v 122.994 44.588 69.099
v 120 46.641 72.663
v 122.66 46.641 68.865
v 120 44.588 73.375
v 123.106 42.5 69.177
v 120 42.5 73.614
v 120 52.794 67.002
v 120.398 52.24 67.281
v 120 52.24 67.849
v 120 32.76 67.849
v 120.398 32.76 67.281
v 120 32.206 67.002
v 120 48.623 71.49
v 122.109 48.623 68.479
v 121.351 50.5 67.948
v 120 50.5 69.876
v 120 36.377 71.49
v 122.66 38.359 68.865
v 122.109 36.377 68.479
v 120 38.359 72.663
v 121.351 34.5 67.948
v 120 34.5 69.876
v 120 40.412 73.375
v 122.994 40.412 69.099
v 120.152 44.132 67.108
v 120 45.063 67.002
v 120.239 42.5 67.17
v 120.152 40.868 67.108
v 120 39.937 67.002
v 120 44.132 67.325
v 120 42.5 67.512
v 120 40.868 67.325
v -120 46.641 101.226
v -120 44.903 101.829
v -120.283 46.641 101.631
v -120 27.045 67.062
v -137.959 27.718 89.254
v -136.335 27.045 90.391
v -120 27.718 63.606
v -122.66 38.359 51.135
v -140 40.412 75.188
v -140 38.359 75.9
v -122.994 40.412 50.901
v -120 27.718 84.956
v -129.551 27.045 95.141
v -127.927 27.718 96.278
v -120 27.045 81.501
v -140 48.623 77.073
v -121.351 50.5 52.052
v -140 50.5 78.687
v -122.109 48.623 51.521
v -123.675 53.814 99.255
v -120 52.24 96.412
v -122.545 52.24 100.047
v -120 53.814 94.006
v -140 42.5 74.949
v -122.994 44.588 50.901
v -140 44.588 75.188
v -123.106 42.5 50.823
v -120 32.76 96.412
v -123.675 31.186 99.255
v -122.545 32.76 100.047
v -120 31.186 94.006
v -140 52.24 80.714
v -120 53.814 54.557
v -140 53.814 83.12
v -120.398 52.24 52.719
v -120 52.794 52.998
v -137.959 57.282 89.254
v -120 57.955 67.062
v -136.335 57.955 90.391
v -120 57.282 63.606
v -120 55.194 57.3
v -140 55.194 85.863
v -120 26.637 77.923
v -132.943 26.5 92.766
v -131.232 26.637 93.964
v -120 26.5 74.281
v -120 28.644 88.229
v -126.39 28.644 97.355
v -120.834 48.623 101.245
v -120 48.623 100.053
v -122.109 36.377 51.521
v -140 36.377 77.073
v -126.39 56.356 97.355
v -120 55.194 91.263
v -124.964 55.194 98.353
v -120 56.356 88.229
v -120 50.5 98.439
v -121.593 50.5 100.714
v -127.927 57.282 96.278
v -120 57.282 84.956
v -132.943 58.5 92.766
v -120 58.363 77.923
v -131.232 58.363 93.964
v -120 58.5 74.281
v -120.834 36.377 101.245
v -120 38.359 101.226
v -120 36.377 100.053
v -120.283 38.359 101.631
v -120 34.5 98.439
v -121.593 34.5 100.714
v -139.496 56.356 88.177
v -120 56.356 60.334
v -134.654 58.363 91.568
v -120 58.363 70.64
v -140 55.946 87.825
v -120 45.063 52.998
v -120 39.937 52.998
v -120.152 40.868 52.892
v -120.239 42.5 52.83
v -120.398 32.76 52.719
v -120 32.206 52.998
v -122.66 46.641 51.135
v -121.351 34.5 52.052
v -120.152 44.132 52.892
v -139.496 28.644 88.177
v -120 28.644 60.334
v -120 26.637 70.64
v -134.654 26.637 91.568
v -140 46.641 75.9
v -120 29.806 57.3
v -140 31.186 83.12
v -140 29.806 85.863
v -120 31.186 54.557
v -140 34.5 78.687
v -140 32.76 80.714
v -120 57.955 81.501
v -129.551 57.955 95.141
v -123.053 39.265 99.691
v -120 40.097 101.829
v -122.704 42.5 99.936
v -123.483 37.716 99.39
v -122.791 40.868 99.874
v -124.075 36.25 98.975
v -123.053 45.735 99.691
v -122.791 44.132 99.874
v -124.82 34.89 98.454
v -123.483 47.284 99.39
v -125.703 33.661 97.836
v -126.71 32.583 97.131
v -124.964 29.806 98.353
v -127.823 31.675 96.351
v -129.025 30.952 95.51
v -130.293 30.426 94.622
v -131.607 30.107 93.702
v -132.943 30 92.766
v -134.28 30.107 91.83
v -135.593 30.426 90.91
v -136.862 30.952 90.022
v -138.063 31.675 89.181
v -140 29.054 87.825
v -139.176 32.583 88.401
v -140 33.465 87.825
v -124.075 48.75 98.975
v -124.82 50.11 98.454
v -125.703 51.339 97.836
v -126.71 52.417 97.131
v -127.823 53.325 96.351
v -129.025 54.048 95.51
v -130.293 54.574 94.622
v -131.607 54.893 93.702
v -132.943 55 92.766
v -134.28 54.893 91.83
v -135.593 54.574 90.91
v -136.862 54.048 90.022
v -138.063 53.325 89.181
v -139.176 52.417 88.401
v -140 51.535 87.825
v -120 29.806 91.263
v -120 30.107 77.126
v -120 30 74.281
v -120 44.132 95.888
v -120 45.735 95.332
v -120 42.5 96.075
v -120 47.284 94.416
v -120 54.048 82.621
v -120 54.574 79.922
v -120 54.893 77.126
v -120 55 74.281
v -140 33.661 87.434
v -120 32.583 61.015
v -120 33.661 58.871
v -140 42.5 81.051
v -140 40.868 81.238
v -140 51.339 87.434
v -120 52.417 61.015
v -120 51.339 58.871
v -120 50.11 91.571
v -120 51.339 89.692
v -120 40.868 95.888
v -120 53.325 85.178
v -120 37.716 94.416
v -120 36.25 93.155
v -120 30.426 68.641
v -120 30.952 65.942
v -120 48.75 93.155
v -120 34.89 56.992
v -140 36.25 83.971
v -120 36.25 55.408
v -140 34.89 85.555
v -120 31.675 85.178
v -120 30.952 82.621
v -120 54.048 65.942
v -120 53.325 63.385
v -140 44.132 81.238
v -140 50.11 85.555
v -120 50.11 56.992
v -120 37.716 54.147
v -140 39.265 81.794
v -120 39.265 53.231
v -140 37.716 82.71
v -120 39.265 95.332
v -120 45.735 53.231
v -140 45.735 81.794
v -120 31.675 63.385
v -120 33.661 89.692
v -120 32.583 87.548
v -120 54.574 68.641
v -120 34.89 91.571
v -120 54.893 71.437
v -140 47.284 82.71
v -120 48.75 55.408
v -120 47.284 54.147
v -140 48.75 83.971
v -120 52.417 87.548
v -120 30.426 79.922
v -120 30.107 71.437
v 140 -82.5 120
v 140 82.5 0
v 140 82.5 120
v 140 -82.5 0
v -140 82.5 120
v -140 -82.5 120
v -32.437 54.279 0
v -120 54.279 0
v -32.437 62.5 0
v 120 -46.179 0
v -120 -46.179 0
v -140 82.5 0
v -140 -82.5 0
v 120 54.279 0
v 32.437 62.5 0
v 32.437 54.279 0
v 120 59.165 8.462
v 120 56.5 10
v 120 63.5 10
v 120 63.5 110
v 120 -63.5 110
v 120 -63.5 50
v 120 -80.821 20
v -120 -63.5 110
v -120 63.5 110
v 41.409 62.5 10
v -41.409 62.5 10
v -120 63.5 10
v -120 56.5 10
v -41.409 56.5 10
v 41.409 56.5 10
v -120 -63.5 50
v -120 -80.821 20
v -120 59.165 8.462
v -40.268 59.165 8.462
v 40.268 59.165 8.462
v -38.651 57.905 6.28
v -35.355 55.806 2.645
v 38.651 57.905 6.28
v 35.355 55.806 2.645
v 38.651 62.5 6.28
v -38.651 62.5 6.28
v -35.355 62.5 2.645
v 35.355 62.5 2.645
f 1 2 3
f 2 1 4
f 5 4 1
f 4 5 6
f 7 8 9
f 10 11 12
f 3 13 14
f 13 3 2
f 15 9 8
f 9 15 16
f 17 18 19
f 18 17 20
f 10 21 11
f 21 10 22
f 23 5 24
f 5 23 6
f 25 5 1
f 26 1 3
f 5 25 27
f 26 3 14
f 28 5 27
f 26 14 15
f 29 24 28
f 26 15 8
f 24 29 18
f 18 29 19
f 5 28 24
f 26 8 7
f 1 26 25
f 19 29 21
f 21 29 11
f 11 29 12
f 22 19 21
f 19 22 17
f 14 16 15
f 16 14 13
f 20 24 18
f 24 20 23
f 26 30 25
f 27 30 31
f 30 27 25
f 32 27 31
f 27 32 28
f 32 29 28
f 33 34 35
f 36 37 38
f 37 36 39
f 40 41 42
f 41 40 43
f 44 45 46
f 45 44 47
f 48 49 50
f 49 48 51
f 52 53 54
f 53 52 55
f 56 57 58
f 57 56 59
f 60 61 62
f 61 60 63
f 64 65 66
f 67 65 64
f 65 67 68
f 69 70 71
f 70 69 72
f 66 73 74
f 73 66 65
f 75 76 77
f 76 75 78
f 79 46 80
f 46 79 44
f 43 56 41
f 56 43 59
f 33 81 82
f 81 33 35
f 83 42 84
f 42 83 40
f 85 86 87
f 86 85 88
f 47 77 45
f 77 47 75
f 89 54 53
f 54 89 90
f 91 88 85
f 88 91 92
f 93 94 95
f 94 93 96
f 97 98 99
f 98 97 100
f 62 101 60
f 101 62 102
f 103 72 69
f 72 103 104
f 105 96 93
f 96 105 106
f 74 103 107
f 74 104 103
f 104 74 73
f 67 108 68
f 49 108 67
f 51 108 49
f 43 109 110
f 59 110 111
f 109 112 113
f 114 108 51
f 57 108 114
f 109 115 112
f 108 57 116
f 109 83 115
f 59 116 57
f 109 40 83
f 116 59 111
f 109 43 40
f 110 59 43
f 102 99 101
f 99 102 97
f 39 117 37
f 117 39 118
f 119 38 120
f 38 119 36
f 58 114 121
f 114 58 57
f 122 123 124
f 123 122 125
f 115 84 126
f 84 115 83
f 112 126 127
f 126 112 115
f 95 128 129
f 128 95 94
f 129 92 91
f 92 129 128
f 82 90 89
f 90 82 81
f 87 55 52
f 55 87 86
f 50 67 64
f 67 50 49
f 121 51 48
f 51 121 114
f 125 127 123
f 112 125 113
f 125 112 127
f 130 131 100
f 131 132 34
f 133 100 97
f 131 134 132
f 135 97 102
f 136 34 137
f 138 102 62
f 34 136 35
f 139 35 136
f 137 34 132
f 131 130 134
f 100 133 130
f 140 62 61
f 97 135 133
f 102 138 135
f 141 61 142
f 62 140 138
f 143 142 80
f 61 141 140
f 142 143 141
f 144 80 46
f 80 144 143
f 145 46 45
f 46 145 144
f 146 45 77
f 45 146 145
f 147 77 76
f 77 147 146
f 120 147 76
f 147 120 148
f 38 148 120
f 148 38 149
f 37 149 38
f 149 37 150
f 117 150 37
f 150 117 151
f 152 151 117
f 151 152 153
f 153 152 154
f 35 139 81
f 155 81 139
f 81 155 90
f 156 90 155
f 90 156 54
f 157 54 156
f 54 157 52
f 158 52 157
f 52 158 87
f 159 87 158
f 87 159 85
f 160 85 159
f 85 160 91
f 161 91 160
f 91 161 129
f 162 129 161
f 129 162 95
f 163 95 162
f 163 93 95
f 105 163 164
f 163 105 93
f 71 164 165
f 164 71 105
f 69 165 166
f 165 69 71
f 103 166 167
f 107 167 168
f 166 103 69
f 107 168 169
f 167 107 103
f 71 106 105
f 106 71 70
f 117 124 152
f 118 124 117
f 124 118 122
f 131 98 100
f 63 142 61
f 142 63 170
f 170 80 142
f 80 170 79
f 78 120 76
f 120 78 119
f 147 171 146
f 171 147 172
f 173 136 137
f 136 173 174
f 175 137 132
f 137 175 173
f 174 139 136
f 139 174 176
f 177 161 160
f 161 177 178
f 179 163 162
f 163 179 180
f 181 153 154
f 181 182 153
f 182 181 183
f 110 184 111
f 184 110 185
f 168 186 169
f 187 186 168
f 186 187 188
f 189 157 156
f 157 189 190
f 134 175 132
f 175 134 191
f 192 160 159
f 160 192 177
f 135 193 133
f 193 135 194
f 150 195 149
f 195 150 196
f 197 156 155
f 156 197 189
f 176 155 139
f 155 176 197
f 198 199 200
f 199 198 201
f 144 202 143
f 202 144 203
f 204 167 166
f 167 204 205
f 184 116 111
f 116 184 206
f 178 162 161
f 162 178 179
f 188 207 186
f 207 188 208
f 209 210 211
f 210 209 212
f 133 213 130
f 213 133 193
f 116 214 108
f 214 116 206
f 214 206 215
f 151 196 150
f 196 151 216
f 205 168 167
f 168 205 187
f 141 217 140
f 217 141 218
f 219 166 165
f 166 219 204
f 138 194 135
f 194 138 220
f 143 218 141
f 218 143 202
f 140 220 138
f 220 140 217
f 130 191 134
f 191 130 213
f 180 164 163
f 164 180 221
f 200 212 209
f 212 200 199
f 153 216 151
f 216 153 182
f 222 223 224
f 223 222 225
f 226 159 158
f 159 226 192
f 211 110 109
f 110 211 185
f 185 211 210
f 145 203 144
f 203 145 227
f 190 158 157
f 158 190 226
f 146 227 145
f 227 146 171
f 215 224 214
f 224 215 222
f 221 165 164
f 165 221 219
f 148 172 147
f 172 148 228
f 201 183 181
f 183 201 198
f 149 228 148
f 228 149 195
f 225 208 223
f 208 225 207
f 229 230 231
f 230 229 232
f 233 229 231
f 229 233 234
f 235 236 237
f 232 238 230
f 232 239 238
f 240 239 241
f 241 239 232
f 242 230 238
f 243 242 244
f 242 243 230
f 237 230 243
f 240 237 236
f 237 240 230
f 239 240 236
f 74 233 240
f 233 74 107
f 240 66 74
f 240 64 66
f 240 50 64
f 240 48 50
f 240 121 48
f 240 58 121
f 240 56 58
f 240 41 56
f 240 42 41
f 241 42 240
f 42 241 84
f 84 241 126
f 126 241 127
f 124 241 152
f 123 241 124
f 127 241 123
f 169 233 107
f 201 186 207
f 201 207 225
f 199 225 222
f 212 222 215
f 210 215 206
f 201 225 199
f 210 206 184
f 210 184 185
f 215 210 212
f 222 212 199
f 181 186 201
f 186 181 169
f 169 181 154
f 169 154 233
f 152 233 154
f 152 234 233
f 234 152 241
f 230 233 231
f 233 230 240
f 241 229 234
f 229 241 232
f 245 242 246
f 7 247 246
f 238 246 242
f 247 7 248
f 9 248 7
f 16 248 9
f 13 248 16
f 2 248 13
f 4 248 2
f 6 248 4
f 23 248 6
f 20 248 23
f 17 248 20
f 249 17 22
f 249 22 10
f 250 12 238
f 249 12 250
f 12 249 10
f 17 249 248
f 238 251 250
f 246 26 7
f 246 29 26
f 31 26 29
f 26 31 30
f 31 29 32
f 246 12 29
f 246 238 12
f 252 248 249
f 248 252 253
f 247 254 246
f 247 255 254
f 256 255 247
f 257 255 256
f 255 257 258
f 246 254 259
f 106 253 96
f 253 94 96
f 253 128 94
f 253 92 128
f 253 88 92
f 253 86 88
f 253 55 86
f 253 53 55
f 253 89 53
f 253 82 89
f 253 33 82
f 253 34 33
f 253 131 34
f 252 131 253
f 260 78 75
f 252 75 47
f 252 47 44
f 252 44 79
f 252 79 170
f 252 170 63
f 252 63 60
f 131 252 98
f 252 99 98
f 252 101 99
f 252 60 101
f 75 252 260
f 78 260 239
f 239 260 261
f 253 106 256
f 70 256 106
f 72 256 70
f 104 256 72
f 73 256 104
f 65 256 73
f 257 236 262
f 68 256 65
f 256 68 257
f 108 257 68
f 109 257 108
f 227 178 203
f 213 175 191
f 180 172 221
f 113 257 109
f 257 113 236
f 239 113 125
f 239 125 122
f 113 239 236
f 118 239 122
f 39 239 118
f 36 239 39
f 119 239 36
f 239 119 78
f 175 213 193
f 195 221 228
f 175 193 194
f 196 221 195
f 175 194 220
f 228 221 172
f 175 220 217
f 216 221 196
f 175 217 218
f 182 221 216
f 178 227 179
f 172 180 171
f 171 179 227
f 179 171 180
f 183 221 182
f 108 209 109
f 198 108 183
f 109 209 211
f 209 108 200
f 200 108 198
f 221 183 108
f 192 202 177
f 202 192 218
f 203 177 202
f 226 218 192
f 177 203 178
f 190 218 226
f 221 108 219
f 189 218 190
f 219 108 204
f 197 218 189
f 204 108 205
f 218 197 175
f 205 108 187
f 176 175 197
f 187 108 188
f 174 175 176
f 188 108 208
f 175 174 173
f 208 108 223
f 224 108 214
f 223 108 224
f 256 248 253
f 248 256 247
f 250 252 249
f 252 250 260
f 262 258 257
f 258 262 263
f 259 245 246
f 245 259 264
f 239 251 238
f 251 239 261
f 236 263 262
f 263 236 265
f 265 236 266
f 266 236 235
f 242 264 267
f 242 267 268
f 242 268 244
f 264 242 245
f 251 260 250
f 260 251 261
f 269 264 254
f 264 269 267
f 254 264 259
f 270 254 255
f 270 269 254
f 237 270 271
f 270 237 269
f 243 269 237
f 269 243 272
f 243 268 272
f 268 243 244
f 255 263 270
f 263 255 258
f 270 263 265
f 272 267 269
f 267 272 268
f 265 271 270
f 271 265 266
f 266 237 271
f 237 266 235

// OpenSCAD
// Bottom-Front (simple)
outer_w=280; outer_d=165; outer_h=120;
inner_w=240; inner_d=127; inner_h=100; bottom_wall=10;
module shell(){ translate([-outer_w/2,-outer_d/2,0]) cube([outer_w,outer_d,outer_h]); }
module hollow(){ translate([-inner_w/2,-inner_d/2,bottom_wall]) cube([inner_w,inner_d,inner_h]); }
module funnel(){ translate([-inner_w/2,-inner_d/2,bottom_wall]) rotate([-30,0,0]) translate([0,-20,0]) cube([inner_w,inner_d,60]); }
module chamber(){ translate([0, outer_d/2-20, outer_h/2-22]) rotate([90,0,0]) cylinder(h=45,r=50,$fn=64); }
module port(x=1){ translate([x*(outer_w/2-30), outer_d/2-40, outer_h/2]) rotate([0,-35,0]) difference(){ cylinder(h=40,r=16,$fn=48); translate([0,0,0]) cylinder(h=42,r=12.5,$fn=48);} }
difference(){ shell(); hollow(); funnel(); chamber(); port(1); port(-1); }
